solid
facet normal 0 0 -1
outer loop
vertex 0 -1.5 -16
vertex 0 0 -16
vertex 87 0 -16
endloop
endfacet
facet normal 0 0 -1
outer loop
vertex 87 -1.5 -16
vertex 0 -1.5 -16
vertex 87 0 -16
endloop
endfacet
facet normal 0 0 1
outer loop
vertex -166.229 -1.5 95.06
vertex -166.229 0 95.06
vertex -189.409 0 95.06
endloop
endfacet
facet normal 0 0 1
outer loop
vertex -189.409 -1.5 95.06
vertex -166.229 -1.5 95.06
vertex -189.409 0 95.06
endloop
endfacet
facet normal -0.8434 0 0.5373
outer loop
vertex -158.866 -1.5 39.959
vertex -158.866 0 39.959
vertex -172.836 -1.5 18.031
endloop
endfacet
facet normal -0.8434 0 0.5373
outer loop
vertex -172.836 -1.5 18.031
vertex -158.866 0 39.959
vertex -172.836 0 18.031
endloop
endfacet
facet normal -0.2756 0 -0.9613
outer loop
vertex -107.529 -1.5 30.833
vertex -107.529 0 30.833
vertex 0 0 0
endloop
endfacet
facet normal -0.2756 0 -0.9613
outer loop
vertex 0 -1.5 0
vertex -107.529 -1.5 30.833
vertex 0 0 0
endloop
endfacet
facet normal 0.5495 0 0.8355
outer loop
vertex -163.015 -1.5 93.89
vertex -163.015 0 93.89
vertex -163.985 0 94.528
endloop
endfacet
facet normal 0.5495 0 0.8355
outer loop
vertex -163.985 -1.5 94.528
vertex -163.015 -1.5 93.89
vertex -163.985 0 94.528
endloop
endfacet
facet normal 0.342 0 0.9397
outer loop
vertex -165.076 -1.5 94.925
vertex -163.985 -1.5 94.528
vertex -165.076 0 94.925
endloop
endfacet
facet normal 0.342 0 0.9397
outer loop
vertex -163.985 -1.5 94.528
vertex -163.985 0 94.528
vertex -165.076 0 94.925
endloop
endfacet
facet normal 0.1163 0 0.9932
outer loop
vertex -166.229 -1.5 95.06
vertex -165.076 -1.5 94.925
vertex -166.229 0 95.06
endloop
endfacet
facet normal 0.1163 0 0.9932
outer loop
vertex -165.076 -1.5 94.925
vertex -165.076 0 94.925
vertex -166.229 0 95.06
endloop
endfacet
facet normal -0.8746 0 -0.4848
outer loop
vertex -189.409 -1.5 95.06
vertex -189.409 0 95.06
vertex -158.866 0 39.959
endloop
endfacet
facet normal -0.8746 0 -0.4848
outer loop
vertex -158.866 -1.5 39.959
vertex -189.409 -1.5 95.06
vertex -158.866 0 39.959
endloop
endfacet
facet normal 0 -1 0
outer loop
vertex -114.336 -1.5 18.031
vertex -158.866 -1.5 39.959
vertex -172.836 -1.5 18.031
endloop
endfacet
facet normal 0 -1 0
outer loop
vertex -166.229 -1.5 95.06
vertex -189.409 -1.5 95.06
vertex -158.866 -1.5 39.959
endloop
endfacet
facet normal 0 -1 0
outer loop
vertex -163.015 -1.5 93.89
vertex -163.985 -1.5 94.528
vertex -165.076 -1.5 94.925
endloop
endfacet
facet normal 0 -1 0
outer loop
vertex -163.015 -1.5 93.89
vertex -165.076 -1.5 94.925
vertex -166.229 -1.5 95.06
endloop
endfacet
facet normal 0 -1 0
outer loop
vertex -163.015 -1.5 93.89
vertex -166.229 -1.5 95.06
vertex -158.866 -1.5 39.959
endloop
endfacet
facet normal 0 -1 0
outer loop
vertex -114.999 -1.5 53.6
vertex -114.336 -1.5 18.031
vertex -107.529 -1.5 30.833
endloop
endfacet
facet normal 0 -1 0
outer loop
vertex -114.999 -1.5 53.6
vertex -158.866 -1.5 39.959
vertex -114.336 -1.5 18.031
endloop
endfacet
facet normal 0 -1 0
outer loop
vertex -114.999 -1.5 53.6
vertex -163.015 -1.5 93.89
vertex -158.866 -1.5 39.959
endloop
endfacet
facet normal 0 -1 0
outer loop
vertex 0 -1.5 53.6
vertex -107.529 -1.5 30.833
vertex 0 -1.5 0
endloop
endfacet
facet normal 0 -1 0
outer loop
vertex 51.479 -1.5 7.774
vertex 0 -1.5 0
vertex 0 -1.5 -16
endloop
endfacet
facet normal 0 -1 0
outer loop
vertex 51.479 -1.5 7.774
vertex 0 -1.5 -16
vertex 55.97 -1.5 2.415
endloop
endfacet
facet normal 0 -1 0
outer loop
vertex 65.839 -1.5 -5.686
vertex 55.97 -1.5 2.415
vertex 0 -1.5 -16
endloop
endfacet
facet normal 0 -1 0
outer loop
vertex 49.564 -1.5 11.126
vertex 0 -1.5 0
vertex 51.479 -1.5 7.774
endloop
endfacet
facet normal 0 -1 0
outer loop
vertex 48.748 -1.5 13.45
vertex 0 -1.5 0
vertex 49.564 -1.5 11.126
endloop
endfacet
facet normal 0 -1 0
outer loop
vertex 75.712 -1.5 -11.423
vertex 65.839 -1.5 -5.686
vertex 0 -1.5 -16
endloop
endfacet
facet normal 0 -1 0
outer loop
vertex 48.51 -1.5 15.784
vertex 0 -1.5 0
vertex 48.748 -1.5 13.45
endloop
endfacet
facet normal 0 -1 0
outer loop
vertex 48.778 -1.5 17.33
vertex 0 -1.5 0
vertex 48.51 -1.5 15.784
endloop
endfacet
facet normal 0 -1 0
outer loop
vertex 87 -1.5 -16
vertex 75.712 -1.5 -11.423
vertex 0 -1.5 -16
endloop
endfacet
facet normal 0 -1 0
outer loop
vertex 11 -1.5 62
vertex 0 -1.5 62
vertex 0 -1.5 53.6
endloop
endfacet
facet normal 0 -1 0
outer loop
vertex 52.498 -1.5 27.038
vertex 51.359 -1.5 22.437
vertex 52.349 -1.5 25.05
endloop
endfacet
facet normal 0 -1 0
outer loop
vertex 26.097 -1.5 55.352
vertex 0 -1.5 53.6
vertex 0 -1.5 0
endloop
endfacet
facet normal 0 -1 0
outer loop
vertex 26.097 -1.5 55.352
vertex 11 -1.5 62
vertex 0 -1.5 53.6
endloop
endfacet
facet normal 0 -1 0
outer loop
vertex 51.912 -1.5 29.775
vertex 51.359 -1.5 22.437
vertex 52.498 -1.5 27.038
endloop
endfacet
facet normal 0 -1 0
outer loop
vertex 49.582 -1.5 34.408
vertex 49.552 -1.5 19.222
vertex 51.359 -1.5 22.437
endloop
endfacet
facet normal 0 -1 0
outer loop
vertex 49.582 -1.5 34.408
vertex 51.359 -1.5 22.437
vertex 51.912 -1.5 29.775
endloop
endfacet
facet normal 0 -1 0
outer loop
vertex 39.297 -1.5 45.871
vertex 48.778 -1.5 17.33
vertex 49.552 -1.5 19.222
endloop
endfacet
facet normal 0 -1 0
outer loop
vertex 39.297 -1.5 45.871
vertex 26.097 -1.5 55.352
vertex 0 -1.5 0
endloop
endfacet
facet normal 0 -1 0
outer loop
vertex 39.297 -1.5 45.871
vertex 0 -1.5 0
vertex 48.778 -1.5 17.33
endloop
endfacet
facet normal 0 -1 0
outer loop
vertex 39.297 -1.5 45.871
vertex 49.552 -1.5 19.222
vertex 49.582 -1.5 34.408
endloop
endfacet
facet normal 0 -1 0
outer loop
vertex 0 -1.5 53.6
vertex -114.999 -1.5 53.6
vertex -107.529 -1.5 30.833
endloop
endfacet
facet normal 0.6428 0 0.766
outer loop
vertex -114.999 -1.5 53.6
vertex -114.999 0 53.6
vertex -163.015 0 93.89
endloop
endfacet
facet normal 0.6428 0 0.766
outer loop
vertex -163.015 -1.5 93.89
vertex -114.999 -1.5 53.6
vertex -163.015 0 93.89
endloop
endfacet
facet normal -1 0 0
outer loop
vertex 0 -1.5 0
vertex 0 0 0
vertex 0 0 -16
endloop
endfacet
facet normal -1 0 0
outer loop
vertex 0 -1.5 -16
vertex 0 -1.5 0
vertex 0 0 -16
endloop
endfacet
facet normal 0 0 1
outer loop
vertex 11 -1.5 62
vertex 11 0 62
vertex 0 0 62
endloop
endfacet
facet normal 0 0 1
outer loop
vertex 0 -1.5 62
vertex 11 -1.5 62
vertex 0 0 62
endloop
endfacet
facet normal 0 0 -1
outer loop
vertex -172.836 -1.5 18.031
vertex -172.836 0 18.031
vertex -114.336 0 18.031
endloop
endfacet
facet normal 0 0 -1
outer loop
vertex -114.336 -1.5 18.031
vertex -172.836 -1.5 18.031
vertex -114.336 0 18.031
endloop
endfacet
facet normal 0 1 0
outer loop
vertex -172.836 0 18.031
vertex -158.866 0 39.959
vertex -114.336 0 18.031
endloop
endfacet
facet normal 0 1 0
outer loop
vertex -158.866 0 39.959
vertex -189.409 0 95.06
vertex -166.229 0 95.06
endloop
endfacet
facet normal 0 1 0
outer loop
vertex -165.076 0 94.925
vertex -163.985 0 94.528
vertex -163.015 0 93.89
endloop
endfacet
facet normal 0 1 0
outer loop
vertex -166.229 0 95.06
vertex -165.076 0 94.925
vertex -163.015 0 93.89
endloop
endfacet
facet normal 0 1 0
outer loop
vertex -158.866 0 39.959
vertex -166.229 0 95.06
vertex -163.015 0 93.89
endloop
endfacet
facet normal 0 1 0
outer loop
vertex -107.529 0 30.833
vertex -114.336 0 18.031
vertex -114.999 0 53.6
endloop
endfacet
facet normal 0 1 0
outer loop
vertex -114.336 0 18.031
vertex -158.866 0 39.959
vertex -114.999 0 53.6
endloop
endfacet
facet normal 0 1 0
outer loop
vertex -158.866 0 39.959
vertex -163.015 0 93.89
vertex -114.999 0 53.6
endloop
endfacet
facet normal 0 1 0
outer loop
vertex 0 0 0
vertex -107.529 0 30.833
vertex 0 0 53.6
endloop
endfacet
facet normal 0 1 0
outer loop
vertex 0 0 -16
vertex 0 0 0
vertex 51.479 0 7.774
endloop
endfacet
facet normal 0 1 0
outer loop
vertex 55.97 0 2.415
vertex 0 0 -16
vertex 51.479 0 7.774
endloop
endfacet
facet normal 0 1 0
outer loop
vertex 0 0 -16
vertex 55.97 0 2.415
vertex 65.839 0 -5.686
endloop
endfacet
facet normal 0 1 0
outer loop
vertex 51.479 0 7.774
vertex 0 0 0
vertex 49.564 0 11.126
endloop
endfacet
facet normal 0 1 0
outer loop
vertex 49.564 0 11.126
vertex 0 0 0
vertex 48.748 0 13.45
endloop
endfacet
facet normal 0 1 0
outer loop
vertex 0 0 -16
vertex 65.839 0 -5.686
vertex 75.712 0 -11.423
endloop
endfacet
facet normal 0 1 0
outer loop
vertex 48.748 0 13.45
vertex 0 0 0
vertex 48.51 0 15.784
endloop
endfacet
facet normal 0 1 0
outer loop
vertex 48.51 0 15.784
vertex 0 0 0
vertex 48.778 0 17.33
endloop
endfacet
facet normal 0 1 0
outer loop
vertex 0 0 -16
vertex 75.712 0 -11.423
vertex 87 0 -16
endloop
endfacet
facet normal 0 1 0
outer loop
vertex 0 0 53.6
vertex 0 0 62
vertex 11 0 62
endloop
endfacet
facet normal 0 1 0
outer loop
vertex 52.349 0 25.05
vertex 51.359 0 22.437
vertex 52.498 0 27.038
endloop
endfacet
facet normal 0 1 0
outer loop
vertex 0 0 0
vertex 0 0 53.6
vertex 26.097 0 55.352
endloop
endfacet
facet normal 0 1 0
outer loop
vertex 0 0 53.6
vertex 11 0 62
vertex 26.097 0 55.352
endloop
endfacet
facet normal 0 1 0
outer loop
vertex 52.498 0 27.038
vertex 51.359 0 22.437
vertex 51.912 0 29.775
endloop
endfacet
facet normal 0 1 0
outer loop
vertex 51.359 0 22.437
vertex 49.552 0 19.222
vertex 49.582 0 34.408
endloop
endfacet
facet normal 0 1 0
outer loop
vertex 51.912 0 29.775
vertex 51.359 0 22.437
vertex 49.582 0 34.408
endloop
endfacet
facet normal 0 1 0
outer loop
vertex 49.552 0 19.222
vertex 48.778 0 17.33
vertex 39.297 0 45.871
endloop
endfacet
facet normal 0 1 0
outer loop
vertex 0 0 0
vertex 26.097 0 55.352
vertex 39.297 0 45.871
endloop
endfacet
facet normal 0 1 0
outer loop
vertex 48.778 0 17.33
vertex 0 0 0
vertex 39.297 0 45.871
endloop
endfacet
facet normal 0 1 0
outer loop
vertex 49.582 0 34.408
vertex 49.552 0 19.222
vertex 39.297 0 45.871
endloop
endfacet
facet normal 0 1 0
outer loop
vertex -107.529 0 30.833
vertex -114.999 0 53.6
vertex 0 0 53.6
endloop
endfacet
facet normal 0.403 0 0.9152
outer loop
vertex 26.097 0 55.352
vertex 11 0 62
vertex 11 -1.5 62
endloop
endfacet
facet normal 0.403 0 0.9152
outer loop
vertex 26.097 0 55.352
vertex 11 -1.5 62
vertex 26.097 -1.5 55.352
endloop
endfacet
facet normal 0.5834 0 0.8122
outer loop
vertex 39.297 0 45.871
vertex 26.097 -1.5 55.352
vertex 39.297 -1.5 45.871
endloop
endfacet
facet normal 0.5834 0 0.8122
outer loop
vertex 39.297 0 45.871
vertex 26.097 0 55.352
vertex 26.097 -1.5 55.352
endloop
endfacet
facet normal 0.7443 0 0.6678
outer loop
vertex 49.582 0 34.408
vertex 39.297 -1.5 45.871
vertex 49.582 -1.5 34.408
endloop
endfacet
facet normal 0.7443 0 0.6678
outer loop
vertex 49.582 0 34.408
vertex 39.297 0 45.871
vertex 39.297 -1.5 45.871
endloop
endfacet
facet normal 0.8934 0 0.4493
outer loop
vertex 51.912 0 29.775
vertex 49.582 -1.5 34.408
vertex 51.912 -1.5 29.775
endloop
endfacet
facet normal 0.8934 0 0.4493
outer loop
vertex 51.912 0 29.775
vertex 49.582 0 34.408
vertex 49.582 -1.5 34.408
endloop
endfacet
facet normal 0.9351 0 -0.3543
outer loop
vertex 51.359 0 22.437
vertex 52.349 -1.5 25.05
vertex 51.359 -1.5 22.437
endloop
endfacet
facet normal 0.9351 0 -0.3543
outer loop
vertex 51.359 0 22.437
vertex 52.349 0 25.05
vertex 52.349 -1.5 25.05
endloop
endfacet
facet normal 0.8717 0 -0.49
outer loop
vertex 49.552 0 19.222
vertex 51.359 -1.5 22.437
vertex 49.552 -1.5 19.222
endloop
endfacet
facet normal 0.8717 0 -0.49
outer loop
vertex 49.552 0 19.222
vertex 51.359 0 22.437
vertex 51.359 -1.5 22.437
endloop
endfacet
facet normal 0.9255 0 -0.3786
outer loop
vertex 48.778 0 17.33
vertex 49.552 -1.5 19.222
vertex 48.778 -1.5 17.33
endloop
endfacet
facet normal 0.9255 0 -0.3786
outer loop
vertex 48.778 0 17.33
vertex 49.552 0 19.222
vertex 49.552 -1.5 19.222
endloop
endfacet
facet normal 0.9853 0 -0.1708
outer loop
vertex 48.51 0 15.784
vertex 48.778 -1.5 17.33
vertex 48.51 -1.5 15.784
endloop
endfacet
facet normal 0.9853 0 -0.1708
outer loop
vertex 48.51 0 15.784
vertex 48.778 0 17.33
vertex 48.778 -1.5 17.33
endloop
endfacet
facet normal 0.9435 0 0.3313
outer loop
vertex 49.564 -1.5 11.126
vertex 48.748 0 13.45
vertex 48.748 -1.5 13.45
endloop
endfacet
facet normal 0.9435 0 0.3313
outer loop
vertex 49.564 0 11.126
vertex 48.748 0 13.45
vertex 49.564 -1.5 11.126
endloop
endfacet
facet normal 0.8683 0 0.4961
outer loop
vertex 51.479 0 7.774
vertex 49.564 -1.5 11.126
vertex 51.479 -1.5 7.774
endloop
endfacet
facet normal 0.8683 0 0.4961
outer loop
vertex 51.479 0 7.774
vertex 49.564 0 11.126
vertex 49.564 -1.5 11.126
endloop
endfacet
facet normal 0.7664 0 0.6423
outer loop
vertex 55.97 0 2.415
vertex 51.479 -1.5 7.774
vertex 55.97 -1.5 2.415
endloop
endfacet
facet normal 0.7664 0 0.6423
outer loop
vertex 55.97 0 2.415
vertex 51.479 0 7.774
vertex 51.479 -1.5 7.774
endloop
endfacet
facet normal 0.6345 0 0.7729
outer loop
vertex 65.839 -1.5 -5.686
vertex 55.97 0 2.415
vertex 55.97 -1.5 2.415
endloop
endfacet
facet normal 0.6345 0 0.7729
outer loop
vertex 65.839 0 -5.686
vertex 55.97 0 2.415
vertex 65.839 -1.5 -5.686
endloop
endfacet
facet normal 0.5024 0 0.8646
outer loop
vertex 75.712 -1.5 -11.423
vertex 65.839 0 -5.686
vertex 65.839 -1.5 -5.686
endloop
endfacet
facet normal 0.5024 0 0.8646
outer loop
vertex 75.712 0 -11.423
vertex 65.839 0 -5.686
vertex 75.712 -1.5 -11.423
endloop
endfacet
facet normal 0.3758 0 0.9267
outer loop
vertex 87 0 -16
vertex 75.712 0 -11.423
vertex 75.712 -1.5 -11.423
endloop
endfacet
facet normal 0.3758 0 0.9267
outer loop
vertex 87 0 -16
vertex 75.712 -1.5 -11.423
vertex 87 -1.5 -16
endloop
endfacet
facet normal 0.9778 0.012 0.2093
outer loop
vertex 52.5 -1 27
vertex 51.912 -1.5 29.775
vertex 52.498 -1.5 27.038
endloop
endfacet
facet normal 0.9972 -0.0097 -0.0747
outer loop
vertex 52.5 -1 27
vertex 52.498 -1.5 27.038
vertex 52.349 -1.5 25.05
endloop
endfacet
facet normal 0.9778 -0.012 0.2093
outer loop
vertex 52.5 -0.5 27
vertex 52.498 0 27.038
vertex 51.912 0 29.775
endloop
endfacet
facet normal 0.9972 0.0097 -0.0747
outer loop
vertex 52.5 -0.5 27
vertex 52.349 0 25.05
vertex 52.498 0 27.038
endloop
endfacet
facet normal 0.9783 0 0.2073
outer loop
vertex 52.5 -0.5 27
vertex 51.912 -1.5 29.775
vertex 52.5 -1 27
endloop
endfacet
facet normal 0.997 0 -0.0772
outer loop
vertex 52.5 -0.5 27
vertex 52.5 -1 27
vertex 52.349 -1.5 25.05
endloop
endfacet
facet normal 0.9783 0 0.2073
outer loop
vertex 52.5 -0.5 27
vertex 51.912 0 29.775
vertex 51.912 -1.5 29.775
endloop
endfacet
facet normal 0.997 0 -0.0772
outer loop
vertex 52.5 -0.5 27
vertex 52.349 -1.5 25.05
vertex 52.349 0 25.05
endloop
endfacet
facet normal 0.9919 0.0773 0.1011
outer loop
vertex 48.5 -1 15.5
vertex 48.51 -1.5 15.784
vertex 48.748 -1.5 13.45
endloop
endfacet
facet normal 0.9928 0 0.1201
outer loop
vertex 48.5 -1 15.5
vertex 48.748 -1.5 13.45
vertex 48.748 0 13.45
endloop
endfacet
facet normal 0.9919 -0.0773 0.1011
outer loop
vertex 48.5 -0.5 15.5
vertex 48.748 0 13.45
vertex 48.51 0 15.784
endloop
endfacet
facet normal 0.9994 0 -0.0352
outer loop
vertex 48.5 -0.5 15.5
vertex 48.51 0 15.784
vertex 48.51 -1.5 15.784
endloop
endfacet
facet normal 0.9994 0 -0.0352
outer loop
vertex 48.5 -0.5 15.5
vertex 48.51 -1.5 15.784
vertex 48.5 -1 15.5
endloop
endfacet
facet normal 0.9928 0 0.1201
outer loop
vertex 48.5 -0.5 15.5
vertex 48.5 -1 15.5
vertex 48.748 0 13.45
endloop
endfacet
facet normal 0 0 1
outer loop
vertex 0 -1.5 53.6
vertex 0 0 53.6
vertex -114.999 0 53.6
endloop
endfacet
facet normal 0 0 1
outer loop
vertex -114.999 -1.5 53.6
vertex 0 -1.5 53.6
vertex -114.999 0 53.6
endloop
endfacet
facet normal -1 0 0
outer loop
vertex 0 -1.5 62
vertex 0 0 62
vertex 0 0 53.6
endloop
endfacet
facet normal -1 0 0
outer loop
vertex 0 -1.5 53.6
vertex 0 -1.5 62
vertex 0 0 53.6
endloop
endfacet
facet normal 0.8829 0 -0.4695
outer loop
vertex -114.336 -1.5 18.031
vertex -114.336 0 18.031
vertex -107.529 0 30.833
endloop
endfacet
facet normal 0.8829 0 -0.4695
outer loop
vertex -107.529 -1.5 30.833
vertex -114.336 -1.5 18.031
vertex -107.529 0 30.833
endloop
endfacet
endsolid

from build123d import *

# Parameters (mm, degrees)
F1_DEPTH = 1.5


with BuildPart() as f1:
    # F0 (on Front) → F1 (new body)
    with BuildSketch(Plane.XZ):
        with BuildLine():
            Line((11, 62), (0, 62))
            Line((0, 62), (0, 53.6))
            Line((0, 53.6), (0, 0))
            Line((0, 0), (0, -16))
            Line((0, -16), (87, -16))
            add(Edge.make_bspline(
                [(11, 62), (31.5050498735, 55.9866910222), (61.6297667235, 27.7423337667), (40.0721675156, 14.6337271946), (65.1601816989, -8.9823952961), (87, -16)],
                knots=[0, 0, 0, 0, 0.4113848141, 0.6062089181, 1, 1, 1, 1], degree=3))
        make_face()
        with BuildLine():
            Line((0, 0), (0, 53.6))
            Line((0, 53.6), (-114.999259066, 53.6))
            Line((-114.999259066, 53.6), (-163.0150387701, 93.8900230404))
            ThreePointArc((-163.0150387701, 93.8900230404), (-164.5188761019, 94.7582639287), (-166.2289768185, 95.0598008248))
            Line((-166.2289768185, 95.0598008248), (-189.4091256472, 95.0598008248))
            Line((-189.4091256472, 95.0598008248), (-158.8661195717, 39.958759275))
            Line((-158.8661195717, 39.958759275), (-172.8359093887, 18.0305816839))
            Line((-172.8359093887, 18.0305816839), (-114.3359093887, 18.0305816839))
            Line((-114.3359093887, 18.0305816839), (-107.5285717283, 30.8333217803))
            Line((-107.5285717283, 30.8333217803), (0, 0))
        make_face()
    extrude(amount=F1_DEPTH)


solid = f1.part
